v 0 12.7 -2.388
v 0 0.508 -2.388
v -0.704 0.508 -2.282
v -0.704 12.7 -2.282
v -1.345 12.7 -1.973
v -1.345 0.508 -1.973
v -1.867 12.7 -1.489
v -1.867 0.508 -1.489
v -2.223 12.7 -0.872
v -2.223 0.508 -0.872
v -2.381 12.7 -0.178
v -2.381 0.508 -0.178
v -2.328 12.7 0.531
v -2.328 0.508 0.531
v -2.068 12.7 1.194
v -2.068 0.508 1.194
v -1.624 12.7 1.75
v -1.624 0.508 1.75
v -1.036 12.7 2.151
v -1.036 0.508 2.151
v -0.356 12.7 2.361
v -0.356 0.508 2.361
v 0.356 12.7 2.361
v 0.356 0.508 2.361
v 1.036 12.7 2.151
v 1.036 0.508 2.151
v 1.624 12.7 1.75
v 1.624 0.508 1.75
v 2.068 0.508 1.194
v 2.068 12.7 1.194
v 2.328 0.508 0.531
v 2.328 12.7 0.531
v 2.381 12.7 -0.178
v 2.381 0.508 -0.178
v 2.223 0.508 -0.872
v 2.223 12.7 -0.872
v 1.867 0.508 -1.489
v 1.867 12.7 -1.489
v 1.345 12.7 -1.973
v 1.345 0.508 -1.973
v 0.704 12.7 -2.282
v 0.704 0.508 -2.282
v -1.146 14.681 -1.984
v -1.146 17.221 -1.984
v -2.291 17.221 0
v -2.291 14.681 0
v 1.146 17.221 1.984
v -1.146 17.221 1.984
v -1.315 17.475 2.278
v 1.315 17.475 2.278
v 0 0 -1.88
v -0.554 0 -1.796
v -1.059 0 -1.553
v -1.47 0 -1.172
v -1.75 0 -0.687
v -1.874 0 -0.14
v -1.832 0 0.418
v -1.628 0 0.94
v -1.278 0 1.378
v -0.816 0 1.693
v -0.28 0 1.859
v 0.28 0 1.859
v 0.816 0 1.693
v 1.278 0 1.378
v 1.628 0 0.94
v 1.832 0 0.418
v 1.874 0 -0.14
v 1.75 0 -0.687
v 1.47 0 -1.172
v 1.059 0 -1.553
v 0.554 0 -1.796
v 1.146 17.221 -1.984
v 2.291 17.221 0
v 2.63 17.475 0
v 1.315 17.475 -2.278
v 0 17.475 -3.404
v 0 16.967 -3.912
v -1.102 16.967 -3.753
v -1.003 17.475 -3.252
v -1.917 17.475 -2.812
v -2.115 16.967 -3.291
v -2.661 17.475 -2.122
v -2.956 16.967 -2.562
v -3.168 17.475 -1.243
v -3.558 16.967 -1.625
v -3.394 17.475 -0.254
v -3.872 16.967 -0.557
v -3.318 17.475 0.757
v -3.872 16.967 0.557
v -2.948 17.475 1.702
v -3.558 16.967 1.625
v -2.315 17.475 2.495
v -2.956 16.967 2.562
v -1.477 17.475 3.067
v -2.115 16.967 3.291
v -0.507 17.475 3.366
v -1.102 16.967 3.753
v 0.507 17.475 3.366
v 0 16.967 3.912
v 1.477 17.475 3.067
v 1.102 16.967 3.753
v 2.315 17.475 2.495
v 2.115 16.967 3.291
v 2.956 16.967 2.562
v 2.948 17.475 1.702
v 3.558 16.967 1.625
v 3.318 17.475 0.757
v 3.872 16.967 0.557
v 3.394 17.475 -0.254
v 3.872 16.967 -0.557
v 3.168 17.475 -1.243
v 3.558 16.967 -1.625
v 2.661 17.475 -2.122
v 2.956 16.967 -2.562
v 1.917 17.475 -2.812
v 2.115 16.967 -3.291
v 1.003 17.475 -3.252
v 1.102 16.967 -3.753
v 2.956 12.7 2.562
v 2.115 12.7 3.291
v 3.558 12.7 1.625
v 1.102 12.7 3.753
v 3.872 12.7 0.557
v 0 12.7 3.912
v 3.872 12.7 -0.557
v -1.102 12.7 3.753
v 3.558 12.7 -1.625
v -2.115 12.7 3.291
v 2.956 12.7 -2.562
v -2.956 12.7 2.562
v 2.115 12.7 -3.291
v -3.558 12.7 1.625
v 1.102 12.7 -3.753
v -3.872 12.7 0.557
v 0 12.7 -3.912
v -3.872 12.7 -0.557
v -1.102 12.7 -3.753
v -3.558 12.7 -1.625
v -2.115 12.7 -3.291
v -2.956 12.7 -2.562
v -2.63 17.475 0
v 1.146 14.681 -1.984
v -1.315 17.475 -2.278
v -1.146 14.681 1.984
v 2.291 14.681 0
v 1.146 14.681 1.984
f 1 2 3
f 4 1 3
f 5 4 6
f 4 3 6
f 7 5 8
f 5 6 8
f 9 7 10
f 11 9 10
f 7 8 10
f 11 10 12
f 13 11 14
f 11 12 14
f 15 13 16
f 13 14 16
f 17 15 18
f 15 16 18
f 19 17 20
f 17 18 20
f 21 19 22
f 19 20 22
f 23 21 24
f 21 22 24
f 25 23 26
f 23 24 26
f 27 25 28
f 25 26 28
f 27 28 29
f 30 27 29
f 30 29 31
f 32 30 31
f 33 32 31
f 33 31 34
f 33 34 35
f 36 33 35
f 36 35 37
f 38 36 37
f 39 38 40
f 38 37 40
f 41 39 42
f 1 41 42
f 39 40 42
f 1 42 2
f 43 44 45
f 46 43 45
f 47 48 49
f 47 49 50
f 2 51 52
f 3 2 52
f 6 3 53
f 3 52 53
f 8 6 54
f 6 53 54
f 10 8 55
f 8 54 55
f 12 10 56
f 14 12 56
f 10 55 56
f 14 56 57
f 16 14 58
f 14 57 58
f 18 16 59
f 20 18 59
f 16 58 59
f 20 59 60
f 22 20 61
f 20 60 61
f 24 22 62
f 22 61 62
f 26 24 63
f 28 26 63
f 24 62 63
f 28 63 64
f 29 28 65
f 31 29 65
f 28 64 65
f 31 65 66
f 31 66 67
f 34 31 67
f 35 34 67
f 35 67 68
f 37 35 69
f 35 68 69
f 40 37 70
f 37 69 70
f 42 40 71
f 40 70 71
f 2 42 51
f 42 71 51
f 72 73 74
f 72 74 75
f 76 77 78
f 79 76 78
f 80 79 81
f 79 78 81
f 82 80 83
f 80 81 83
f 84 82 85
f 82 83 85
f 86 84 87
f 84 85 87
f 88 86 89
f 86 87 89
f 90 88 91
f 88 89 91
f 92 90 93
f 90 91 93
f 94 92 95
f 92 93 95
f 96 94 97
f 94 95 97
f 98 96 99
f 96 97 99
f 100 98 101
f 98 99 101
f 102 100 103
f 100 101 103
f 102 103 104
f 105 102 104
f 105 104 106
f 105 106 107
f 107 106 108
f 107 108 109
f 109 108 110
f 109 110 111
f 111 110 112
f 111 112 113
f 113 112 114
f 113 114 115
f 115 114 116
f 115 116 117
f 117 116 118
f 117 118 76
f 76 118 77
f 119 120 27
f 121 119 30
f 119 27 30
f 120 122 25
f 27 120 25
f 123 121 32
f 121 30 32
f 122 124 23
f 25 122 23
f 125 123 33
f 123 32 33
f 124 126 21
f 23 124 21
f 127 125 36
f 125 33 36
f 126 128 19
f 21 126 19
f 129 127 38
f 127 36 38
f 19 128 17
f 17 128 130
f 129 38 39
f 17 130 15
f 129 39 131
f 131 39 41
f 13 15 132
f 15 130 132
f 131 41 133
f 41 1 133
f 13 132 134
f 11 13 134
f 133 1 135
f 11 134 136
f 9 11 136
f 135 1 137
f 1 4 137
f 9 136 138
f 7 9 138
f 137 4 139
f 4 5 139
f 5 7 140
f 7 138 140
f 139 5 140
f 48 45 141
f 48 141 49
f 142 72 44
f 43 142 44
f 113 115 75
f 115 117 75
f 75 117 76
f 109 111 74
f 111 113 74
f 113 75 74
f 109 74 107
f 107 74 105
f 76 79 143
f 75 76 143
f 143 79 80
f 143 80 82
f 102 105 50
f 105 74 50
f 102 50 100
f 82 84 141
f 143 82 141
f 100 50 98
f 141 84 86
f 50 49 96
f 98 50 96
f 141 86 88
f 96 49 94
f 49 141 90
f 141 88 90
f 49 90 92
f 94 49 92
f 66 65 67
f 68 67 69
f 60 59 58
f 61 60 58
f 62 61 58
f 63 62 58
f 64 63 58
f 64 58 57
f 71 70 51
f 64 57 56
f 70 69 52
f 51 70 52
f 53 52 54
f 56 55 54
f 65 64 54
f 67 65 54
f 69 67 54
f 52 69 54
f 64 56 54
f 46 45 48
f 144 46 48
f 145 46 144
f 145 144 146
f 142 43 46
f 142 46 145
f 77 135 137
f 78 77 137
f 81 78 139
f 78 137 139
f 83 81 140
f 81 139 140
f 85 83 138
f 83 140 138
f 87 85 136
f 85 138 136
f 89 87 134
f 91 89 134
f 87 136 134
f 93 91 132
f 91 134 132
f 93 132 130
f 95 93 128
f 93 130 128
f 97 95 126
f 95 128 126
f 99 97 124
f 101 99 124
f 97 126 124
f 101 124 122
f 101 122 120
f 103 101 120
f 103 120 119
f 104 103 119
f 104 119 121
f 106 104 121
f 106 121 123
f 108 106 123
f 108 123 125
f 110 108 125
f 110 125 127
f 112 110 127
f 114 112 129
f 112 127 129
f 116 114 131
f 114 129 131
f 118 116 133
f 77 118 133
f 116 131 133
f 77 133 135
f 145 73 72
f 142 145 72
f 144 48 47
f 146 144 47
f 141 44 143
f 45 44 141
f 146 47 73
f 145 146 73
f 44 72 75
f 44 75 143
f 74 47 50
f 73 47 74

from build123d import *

# Parameters (mm, degrees)
EXTRUDE1_DEPTH = 2.794
CHAMFER1_SIZE  = 0.508
CHAMFER2_SIZE  = 0.29329394
CHAMFER2_SIZE2 = 0.253999961


with BuildPart() as part:
    # Sketch1 → Revolve1 (revolve)
    with BuildSketch(Plane.XY, mode=Mode.PRIVATE) as revolve1_sk:
        Polygon((0, 0), (0, 17.4752), (-3.9116, 17.4752), (-3.9116, 12.7), (-2.3876, 12.7), (-2.3876, 0), align=None)
    revolve(revolve1_sk.sketch.rotate(Axis((0, 0, 0), (0, 1, 0)), 270), axis=Axis((0, 0, 0), (0, 1, 0)))

    # Sketch2 → Extrude1 (cut)
    with BuildSketch(Plane(origin=(0, 17.4752, 0), x_dir=(1, 0, 0), z_dir=(0, 1, 0))):
        Polygon((2.2913594, 0), (1.1456797, 1.98437545), (-1.1456797, 1.98437545), (-2.2913594, 0), (-1.1456797, -1.98437545), (1.1456797, -1.98437545), align=None)
    extrude(amount=-EXTRUDE1_DEPTH, mode=Mode.SUBTRACT)

    # Chamfer1
    chamfer1_edges = [part.edges().sort_by_distance(p)[0] for p in [
        (0, 0, 2.3876),
        (0, 17.4752, 3.9116),
    ]]
    chamfer(chamfer1_edges, length=CHAMFER1_SIZE)

    # Chamfer2
    chamfer2_edges = [part.edges().sort_by_distance(p)[0] for p in [
        (1.71851955, 17.4752, 0.992187725),
        (1.71851955, 17.4752, -0.992187725),
        (0, 17.4752, -1.98437545),
        (-1.71851955, 17.4752, -0.992187725),
        (-1.71851955, 17.4752, 0.992187725),
        (0, 17.4752, 1.98437545),
    ]]
    chamfer2_side = [part.faces().sort_by_distance(p)[0] for p in [
        (0, 17.4752, 3.307331654),
    ]]
    chamfer(chamfer2_edges, length=CHAMFER2_SIZE, length2=CHAMFER2_SIZE2, reference=chamfer2_side[0])


solid = part.part
